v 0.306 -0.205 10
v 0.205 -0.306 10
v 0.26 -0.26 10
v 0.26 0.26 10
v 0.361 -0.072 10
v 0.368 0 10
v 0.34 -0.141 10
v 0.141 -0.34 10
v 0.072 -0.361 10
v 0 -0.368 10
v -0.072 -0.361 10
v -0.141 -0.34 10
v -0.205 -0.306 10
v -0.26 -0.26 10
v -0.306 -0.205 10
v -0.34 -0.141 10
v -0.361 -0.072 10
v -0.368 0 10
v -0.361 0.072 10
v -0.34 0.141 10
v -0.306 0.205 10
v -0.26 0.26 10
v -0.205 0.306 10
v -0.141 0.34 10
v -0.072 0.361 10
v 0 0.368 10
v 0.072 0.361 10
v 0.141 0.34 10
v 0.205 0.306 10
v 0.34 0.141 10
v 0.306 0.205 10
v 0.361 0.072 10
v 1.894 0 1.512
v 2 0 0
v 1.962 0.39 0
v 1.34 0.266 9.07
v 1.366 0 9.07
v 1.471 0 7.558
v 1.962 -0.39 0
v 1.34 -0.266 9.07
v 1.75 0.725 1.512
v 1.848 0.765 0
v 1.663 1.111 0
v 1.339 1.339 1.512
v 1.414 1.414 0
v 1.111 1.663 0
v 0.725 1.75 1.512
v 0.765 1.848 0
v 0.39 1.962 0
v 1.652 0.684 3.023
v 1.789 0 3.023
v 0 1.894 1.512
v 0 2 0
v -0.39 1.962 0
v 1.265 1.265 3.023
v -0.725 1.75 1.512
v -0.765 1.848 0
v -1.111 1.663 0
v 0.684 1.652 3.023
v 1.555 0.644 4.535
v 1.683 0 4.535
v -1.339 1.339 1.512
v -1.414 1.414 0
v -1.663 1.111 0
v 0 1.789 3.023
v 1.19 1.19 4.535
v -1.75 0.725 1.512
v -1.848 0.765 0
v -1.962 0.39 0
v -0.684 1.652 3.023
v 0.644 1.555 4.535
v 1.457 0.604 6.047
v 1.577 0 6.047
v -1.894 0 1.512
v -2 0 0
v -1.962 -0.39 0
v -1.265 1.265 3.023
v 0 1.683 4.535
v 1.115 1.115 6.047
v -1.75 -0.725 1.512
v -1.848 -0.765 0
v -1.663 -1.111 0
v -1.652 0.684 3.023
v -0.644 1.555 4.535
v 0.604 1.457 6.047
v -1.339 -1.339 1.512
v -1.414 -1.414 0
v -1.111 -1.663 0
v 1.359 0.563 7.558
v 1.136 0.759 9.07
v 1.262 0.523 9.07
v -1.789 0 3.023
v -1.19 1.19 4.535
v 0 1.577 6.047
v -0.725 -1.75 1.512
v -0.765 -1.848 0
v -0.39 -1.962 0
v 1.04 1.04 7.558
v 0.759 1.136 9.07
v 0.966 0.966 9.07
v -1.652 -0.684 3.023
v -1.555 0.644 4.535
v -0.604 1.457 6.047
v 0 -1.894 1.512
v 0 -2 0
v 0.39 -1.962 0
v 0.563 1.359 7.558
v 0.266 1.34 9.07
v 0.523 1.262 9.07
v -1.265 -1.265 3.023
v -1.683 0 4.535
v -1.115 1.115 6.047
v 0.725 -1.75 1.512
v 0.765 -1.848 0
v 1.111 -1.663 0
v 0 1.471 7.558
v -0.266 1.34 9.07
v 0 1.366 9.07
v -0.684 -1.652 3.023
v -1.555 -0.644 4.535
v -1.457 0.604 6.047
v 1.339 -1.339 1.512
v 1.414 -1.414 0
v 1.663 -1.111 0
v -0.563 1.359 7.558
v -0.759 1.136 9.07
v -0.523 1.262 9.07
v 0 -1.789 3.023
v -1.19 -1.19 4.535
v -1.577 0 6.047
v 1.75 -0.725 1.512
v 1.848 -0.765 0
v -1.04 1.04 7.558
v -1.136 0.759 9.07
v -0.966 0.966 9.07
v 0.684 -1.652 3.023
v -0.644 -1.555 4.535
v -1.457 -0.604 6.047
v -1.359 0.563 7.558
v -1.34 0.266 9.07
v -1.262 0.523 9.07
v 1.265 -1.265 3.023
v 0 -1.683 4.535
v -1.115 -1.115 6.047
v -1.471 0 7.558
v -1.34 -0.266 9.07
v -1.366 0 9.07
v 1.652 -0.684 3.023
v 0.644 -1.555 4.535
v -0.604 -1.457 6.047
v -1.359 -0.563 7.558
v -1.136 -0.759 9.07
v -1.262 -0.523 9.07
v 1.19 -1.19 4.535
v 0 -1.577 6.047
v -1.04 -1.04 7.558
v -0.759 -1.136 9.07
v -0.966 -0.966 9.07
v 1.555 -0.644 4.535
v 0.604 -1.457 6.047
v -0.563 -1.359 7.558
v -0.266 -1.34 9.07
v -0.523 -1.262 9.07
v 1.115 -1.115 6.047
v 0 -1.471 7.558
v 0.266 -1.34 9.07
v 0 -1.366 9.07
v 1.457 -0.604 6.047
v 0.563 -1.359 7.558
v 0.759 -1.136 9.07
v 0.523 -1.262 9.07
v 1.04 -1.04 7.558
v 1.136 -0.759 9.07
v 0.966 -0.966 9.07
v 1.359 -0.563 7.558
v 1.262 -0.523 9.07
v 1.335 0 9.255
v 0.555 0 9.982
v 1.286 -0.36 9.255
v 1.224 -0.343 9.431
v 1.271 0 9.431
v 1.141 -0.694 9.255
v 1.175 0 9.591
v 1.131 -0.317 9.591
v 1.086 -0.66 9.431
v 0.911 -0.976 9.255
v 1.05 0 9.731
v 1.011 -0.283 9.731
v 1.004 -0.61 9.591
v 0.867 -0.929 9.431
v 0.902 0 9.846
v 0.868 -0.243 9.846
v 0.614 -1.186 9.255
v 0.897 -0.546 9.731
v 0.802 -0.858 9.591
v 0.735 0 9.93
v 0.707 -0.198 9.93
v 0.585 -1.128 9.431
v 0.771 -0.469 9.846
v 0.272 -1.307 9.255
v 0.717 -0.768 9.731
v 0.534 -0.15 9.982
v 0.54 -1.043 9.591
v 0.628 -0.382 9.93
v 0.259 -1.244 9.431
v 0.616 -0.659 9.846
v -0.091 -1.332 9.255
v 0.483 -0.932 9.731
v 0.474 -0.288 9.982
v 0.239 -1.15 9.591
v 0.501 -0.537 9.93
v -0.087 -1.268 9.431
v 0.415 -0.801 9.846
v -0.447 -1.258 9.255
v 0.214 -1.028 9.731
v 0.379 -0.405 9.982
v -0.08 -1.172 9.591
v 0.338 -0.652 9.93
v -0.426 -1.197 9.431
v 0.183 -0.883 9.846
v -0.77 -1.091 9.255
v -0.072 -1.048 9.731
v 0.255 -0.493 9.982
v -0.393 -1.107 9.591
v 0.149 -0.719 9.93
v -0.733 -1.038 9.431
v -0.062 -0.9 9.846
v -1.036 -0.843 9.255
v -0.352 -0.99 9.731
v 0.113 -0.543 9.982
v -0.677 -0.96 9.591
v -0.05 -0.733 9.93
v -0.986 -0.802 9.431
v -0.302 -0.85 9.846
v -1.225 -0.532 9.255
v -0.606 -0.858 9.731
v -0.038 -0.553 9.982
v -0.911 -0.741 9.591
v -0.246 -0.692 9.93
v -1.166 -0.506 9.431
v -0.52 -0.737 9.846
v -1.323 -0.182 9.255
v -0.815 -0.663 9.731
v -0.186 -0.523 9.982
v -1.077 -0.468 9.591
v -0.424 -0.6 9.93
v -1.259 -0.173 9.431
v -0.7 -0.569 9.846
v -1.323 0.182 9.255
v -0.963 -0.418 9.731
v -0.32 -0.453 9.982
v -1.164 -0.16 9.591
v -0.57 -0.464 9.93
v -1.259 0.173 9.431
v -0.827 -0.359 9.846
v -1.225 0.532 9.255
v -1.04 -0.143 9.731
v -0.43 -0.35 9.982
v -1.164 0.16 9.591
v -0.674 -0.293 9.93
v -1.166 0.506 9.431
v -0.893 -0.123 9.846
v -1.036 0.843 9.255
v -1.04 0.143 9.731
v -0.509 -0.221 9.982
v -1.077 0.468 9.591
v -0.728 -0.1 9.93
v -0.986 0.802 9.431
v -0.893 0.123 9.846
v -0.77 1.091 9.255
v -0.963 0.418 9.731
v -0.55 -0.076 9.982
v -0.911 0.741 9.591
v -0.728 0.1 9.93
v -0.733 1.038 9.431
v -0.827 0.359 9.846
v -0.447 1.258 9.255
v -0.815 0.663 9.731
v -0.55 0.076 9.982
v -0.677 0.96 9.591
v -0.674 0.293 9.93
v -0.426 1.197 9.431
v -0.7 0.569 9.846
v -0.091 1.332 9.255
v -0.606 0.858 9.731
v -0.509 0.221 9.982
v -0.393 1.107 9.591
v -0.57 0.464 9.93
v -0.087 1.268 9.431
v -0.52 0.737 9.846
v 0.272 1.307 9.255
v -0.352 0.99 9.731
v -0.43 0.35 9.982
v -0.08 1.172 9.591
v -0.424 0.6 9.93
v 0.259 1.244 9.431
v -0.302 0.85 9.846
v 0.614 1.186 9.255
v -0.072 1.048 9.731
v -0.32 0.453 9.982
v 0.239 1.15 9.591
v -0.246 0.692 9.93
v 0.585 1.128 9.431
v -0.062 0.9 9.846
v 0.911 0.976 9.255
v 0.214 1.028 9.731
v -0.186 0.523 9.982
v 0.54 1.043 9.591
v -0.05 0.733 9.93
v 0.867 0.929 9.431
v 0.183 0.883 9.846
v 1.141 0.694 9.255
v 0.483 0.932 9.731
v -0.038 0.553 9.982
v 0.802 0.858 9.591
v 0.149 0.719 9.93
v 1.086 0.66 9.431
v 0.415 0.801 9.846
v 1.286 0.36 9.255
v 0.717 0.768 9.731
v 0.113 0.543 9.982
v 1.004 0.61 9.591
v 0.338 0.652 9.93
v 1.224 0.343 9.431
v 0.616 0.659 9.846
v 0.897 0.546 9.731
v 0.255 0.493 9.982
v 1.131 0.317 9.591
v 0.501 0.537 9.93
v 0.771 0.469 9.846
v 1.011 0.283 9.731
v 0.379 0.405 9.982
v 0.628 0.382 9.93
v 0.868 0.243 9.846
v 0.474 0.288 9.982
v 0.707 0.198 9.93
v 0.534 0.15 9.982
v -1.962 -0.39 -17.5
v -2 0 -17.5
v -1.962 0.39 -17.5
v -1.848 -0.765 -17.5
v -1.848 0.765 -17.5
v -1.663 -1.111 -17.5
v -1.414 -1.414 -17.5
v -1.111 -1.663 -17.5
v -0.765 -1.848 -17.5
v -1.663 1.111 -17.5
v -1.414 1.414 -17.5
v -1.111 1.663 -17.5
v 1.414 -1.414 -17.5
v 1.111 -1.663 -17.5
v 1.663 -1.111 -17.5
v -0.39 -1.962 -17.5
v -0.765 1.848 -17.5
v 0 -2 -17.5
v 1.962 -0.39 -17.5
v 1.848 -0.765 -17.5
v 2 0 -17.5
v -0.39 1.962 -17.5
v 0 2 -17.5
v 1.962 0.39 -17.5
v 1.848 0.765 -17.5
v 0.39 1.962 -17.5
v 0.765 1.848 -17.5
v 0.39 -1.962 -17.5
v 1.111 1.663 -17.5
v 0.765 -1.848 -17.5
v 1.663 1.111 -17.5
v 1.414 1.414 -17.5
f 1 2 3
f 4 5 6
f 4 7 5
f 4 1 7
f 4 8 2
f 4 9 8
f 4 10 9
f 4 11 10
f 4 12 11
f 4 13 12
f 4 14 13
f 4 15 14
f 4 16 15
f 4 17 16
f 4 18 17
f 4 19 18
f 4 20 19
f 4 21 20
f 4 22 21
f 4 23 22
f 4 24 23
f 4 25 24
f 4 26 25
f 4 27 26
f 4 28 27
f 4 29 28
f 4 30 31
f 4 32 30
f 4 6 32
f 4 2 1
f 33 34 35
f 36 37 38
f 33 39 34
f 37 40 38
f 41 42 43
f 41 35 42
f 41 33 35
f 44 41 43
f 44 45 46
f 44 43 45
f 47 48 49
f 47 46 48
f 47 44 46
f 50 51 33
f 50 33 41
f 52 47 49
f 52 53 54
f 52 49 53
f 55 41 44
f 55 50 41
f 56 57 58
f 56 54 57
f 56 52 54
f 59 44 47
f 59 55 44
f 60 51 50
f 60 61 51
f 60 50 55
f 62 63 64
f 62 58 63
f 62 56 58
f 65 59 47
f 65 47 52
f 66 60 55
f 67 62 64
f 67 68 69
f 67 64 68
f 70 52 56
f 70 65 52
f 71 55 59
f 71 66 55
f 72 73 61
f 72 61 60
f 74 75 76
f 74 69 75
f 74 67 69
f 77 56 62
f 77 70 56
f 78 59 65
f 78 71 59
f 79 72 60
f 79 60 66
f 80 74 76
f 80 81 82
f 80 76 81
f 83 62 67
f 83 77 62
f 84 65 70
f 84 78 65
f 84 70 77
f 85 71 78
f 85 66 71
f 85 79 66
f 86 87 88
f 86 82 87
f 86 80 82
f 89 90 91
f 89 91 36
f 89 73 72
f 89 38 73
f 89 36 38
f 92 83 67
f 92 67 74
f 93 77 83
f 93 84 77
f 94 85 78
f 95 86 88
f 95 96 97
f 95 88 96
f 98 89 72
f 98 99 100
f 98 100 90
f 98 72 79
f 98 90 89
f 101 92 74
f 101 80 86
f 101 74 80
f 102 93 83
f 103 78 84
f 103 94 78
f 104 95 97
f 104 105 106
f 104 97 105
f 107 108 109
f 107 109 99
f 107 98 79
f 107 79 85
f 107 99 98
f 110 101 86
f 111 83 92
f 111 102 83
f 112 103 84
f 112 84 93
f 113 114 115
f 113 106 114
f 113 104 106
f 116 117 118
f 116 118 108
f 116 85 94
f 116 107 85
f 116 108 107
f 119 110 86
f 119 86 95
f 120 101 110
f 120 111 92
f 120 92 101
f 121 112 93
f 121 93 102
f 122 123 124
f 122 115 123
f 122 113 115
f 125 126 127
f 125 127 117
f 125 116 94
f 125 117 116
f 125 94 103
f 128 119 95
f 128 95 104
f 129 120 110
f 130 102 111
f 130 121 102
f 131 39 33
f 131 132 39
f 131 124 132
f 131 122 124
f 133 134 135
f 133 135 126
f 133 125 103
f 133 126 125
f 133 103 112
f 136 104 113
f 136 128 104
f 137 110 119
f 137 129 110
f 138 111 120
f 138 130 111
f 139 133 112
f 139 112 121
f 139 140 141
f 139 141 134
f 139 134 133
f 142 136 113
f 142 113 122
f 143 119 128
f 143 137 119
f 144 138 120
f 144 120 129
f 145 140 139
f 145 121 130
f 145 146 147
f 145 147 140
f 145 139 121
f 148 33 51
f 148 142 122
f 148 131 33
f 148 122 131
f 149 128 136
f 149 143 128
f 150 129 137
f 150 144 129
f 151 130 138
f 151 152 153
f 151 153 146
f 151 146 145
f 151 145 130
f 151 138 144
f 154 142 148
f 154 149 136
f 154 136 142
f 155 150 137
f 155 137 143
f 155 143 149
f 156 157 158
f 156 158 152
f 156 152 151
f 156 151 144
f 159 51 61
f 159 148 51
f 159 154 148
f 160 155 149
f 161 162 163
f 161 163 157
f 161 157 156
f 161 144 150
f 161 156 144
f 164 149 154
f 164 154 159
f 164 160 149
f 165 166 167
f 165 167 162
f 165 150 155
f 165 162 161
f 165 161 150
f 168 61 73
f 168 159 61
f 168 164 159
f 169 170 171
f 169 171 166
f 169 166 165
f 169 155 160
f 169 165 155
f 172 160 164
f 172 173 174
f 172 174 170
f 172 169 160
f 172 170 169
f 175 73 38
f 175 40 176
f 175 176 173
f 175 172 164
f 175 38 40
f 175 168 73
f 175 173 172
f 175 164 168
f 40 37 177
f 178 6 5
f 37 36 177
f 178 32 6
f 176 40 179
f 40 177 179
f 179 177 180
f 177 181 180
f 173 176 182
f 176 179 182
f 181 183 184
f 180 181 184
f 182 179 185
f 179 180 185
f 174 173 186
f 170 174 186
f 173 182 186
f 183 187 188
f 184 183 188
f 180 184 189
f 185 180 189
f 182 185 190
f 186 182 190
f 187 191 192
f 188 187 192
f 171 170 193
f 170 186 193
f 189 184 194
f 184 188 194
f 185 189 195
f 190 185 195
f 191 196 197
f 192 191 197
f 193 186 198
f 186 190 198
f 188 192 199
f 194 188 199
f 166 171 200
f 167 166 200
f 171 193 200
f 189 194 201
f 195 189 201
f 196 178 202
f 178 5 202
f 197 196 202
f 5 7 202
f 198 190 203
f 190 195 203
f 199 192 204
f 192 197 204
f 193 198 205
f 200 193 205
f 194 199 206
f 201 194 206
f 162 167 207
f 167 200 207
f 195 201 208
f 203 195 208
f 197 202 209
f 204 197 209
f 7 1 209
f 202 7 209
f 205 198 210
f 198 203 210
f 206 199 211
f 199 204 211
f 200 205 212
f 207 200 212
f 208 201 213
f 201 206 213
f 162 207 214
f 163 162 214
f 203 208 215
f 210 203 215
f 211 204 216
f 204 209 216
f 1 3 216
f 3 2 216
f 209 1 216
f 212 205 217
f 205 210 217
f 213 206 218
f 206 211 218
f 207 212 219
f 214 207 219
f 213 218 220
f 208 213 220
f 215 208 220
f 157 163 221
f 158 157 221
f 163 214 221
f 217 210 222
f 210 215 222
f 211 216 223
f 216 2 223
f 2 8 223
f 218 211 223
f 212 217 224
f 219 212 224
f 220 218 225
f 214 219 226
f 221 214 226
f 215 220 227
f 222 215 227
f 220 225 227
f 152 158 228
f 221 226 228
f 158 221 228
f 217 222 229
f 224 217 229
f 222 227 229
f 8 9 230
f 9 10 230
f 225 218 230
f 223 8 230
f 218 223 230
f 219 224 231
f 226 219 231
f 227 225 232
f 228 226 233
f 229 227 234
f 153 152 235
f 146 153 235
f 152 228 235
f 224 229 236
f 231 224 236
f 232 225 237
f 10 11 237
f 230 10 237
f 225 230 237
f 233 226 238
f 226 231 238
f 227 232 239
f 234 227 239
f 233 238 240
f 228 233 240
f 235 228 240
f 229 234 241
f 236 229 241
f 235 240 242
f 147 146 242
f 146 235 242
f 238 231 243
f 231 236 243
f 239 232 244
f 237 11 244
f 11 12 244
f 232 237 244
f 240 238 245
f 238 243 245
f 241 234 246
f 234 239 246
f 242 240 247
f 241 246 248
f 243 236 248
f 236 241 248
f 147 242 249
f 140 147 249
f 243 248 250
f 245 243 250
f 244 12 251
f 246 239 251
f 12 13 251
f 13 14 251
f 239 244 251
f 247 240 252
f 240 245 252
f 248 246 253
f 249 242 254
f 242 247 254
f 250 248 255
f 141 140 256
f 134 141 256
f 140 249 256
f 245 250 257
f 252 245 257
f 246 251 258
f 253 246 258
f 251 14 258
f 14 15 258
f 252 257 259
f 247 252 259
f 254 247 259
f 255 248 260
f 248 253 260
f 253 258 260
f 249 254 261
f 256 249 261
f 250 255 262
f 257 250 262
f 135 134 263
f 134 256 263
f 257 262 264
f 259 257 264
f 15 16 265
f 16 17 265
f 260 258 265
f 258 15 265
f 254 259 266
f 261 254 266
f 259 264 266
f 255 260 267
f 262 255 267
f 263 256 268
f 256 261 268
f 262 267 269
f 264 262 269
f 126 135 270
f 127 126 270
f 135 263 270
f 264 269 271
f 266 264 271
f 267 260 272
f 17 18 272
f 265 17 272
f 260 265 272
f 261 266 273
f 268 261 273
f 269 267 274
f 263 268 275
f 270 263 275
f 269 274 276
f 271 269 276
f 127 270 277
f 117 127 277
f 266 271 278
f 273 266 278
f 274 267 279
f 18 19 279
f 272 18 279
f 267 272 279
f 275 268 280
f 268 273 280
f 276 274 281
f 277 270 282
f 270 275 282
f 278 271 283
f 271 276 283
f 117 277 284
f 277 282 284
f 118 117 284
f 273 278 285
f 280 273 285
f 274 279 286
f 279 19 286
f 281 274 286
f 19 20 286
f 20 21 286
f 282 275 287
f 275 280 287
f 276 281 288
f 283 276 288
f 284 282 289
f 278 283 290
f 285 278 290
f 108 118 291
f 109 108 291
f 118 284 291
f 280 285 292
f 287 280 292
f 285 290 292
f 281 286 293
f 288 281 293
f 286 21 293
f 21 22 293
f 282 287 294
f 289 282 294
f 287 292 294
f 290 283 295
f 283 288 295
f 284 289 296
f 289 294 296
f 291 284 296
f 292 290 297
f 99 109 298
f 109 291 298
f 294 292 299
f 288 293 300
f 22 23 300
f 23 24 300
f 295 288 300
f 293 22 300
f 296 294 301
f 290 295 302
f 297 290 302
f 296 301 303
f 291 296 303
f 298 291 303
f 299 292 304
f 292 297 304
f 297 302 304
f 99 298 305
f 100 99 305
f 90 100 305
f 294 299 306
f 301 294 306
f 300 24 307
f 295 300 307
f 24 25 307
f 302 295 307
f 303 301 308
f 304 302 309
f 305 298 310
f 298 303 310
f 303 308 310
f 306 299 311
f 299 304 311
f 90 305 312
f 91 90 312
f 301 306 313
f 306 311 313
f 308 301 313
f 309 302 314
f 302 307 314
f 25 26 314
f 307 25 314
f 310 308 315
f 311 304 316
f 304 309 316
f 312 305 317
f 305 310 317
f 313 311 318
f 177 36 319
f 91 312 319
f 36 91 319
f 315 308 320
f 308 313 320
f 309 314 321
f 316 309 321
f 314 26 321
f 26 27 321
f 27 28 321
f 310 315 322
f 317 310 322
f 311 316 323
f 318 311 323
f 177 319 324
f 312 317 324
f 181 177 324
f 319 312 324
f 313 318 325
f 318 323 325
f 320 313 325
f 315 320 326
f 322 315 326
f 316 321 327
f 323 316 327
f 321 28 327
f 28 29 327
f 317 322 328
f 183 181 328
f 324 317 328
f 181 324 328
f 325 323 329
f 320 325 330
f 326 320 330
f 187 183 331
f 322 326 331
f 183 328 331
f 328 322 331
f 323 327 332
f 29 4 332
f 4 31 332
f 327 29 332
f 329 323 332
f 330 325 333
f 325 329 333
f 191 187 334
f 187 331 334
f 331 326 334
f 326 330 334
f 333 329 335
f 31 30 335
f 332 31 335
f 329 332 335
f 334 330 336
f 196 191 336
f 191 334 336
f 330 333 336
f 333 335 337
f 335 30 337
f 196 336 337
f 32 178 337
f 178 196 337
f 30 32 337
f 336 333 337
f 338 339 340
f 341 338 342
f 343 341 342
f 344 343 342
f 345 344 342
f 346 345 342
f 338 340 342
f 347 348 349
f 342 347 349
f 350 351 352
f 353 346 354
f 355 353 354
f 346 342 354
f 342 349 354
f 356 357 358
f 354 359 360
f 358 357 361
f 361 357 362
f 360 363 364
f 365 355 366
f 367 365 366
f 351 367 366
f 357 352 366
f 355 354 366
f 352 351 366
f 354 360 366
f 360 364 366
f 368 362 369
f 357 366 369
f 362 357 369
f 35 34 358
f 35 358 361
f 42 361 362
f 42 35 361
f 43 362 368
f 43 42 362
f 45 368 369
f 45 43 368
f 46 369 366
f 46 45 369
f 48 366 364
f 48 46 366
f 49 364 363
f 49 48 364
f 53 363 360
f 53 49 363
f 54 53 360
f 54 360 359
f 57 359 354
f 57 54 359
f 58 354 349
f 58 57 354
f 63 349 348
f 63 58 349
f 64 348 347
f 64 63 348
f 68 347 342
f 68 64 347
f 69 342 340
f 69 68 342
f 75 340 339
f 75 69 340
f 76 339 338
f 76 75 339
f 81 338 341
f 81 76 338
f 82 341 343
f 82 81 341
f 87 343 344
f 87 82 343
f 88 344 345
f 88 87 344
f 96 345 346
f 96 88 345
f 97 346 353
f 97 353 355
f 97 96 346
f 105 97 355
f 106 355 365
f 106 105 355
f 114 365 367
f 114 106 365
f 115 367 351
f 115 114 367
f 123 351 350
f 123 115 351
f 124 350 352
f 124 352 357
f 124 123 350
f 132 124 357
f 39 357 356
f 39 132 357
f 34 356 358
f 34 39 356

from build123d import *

# Parameters (mm, degrees)
SKETCH1_R           = 2
BOSS_EXTRUDE1_DEPTH = 10
BOSS_EXTRUDE1_TAPER = 4
SKETCH1_2_R         = 2
BOSS_EXTRUDE2_DEPTH = 17.5
FILLET1_R           = 1


with BuildPart() as part:
    # Sketch1 → Boss-Extrude1 (new body)
    with BuildSketch(Plane.XY):
        Circle(SKETCH1_R)
    extrude(amount=BOSS_EXTRUDE1_DEPTH, taper=BOSS_EXTRUDE1_TAPER)

    # Sketch1<2> → Boss-Extrude2 (add)
    with BuildSketch(Plane.XY):
        Circle(SKETCH1_2_R)
    extrude(amount=-BOSS_EXTRUDE2_DEPTH)

    # Fillet1
    fillet1_edges = [part.edges().sort_by_distance(p)[0] for p in [
        (-1.300731881, 0, 10),
    ]]
    fillet(fillet1_edges, radius=FILLET1_R)


solid = part.part
